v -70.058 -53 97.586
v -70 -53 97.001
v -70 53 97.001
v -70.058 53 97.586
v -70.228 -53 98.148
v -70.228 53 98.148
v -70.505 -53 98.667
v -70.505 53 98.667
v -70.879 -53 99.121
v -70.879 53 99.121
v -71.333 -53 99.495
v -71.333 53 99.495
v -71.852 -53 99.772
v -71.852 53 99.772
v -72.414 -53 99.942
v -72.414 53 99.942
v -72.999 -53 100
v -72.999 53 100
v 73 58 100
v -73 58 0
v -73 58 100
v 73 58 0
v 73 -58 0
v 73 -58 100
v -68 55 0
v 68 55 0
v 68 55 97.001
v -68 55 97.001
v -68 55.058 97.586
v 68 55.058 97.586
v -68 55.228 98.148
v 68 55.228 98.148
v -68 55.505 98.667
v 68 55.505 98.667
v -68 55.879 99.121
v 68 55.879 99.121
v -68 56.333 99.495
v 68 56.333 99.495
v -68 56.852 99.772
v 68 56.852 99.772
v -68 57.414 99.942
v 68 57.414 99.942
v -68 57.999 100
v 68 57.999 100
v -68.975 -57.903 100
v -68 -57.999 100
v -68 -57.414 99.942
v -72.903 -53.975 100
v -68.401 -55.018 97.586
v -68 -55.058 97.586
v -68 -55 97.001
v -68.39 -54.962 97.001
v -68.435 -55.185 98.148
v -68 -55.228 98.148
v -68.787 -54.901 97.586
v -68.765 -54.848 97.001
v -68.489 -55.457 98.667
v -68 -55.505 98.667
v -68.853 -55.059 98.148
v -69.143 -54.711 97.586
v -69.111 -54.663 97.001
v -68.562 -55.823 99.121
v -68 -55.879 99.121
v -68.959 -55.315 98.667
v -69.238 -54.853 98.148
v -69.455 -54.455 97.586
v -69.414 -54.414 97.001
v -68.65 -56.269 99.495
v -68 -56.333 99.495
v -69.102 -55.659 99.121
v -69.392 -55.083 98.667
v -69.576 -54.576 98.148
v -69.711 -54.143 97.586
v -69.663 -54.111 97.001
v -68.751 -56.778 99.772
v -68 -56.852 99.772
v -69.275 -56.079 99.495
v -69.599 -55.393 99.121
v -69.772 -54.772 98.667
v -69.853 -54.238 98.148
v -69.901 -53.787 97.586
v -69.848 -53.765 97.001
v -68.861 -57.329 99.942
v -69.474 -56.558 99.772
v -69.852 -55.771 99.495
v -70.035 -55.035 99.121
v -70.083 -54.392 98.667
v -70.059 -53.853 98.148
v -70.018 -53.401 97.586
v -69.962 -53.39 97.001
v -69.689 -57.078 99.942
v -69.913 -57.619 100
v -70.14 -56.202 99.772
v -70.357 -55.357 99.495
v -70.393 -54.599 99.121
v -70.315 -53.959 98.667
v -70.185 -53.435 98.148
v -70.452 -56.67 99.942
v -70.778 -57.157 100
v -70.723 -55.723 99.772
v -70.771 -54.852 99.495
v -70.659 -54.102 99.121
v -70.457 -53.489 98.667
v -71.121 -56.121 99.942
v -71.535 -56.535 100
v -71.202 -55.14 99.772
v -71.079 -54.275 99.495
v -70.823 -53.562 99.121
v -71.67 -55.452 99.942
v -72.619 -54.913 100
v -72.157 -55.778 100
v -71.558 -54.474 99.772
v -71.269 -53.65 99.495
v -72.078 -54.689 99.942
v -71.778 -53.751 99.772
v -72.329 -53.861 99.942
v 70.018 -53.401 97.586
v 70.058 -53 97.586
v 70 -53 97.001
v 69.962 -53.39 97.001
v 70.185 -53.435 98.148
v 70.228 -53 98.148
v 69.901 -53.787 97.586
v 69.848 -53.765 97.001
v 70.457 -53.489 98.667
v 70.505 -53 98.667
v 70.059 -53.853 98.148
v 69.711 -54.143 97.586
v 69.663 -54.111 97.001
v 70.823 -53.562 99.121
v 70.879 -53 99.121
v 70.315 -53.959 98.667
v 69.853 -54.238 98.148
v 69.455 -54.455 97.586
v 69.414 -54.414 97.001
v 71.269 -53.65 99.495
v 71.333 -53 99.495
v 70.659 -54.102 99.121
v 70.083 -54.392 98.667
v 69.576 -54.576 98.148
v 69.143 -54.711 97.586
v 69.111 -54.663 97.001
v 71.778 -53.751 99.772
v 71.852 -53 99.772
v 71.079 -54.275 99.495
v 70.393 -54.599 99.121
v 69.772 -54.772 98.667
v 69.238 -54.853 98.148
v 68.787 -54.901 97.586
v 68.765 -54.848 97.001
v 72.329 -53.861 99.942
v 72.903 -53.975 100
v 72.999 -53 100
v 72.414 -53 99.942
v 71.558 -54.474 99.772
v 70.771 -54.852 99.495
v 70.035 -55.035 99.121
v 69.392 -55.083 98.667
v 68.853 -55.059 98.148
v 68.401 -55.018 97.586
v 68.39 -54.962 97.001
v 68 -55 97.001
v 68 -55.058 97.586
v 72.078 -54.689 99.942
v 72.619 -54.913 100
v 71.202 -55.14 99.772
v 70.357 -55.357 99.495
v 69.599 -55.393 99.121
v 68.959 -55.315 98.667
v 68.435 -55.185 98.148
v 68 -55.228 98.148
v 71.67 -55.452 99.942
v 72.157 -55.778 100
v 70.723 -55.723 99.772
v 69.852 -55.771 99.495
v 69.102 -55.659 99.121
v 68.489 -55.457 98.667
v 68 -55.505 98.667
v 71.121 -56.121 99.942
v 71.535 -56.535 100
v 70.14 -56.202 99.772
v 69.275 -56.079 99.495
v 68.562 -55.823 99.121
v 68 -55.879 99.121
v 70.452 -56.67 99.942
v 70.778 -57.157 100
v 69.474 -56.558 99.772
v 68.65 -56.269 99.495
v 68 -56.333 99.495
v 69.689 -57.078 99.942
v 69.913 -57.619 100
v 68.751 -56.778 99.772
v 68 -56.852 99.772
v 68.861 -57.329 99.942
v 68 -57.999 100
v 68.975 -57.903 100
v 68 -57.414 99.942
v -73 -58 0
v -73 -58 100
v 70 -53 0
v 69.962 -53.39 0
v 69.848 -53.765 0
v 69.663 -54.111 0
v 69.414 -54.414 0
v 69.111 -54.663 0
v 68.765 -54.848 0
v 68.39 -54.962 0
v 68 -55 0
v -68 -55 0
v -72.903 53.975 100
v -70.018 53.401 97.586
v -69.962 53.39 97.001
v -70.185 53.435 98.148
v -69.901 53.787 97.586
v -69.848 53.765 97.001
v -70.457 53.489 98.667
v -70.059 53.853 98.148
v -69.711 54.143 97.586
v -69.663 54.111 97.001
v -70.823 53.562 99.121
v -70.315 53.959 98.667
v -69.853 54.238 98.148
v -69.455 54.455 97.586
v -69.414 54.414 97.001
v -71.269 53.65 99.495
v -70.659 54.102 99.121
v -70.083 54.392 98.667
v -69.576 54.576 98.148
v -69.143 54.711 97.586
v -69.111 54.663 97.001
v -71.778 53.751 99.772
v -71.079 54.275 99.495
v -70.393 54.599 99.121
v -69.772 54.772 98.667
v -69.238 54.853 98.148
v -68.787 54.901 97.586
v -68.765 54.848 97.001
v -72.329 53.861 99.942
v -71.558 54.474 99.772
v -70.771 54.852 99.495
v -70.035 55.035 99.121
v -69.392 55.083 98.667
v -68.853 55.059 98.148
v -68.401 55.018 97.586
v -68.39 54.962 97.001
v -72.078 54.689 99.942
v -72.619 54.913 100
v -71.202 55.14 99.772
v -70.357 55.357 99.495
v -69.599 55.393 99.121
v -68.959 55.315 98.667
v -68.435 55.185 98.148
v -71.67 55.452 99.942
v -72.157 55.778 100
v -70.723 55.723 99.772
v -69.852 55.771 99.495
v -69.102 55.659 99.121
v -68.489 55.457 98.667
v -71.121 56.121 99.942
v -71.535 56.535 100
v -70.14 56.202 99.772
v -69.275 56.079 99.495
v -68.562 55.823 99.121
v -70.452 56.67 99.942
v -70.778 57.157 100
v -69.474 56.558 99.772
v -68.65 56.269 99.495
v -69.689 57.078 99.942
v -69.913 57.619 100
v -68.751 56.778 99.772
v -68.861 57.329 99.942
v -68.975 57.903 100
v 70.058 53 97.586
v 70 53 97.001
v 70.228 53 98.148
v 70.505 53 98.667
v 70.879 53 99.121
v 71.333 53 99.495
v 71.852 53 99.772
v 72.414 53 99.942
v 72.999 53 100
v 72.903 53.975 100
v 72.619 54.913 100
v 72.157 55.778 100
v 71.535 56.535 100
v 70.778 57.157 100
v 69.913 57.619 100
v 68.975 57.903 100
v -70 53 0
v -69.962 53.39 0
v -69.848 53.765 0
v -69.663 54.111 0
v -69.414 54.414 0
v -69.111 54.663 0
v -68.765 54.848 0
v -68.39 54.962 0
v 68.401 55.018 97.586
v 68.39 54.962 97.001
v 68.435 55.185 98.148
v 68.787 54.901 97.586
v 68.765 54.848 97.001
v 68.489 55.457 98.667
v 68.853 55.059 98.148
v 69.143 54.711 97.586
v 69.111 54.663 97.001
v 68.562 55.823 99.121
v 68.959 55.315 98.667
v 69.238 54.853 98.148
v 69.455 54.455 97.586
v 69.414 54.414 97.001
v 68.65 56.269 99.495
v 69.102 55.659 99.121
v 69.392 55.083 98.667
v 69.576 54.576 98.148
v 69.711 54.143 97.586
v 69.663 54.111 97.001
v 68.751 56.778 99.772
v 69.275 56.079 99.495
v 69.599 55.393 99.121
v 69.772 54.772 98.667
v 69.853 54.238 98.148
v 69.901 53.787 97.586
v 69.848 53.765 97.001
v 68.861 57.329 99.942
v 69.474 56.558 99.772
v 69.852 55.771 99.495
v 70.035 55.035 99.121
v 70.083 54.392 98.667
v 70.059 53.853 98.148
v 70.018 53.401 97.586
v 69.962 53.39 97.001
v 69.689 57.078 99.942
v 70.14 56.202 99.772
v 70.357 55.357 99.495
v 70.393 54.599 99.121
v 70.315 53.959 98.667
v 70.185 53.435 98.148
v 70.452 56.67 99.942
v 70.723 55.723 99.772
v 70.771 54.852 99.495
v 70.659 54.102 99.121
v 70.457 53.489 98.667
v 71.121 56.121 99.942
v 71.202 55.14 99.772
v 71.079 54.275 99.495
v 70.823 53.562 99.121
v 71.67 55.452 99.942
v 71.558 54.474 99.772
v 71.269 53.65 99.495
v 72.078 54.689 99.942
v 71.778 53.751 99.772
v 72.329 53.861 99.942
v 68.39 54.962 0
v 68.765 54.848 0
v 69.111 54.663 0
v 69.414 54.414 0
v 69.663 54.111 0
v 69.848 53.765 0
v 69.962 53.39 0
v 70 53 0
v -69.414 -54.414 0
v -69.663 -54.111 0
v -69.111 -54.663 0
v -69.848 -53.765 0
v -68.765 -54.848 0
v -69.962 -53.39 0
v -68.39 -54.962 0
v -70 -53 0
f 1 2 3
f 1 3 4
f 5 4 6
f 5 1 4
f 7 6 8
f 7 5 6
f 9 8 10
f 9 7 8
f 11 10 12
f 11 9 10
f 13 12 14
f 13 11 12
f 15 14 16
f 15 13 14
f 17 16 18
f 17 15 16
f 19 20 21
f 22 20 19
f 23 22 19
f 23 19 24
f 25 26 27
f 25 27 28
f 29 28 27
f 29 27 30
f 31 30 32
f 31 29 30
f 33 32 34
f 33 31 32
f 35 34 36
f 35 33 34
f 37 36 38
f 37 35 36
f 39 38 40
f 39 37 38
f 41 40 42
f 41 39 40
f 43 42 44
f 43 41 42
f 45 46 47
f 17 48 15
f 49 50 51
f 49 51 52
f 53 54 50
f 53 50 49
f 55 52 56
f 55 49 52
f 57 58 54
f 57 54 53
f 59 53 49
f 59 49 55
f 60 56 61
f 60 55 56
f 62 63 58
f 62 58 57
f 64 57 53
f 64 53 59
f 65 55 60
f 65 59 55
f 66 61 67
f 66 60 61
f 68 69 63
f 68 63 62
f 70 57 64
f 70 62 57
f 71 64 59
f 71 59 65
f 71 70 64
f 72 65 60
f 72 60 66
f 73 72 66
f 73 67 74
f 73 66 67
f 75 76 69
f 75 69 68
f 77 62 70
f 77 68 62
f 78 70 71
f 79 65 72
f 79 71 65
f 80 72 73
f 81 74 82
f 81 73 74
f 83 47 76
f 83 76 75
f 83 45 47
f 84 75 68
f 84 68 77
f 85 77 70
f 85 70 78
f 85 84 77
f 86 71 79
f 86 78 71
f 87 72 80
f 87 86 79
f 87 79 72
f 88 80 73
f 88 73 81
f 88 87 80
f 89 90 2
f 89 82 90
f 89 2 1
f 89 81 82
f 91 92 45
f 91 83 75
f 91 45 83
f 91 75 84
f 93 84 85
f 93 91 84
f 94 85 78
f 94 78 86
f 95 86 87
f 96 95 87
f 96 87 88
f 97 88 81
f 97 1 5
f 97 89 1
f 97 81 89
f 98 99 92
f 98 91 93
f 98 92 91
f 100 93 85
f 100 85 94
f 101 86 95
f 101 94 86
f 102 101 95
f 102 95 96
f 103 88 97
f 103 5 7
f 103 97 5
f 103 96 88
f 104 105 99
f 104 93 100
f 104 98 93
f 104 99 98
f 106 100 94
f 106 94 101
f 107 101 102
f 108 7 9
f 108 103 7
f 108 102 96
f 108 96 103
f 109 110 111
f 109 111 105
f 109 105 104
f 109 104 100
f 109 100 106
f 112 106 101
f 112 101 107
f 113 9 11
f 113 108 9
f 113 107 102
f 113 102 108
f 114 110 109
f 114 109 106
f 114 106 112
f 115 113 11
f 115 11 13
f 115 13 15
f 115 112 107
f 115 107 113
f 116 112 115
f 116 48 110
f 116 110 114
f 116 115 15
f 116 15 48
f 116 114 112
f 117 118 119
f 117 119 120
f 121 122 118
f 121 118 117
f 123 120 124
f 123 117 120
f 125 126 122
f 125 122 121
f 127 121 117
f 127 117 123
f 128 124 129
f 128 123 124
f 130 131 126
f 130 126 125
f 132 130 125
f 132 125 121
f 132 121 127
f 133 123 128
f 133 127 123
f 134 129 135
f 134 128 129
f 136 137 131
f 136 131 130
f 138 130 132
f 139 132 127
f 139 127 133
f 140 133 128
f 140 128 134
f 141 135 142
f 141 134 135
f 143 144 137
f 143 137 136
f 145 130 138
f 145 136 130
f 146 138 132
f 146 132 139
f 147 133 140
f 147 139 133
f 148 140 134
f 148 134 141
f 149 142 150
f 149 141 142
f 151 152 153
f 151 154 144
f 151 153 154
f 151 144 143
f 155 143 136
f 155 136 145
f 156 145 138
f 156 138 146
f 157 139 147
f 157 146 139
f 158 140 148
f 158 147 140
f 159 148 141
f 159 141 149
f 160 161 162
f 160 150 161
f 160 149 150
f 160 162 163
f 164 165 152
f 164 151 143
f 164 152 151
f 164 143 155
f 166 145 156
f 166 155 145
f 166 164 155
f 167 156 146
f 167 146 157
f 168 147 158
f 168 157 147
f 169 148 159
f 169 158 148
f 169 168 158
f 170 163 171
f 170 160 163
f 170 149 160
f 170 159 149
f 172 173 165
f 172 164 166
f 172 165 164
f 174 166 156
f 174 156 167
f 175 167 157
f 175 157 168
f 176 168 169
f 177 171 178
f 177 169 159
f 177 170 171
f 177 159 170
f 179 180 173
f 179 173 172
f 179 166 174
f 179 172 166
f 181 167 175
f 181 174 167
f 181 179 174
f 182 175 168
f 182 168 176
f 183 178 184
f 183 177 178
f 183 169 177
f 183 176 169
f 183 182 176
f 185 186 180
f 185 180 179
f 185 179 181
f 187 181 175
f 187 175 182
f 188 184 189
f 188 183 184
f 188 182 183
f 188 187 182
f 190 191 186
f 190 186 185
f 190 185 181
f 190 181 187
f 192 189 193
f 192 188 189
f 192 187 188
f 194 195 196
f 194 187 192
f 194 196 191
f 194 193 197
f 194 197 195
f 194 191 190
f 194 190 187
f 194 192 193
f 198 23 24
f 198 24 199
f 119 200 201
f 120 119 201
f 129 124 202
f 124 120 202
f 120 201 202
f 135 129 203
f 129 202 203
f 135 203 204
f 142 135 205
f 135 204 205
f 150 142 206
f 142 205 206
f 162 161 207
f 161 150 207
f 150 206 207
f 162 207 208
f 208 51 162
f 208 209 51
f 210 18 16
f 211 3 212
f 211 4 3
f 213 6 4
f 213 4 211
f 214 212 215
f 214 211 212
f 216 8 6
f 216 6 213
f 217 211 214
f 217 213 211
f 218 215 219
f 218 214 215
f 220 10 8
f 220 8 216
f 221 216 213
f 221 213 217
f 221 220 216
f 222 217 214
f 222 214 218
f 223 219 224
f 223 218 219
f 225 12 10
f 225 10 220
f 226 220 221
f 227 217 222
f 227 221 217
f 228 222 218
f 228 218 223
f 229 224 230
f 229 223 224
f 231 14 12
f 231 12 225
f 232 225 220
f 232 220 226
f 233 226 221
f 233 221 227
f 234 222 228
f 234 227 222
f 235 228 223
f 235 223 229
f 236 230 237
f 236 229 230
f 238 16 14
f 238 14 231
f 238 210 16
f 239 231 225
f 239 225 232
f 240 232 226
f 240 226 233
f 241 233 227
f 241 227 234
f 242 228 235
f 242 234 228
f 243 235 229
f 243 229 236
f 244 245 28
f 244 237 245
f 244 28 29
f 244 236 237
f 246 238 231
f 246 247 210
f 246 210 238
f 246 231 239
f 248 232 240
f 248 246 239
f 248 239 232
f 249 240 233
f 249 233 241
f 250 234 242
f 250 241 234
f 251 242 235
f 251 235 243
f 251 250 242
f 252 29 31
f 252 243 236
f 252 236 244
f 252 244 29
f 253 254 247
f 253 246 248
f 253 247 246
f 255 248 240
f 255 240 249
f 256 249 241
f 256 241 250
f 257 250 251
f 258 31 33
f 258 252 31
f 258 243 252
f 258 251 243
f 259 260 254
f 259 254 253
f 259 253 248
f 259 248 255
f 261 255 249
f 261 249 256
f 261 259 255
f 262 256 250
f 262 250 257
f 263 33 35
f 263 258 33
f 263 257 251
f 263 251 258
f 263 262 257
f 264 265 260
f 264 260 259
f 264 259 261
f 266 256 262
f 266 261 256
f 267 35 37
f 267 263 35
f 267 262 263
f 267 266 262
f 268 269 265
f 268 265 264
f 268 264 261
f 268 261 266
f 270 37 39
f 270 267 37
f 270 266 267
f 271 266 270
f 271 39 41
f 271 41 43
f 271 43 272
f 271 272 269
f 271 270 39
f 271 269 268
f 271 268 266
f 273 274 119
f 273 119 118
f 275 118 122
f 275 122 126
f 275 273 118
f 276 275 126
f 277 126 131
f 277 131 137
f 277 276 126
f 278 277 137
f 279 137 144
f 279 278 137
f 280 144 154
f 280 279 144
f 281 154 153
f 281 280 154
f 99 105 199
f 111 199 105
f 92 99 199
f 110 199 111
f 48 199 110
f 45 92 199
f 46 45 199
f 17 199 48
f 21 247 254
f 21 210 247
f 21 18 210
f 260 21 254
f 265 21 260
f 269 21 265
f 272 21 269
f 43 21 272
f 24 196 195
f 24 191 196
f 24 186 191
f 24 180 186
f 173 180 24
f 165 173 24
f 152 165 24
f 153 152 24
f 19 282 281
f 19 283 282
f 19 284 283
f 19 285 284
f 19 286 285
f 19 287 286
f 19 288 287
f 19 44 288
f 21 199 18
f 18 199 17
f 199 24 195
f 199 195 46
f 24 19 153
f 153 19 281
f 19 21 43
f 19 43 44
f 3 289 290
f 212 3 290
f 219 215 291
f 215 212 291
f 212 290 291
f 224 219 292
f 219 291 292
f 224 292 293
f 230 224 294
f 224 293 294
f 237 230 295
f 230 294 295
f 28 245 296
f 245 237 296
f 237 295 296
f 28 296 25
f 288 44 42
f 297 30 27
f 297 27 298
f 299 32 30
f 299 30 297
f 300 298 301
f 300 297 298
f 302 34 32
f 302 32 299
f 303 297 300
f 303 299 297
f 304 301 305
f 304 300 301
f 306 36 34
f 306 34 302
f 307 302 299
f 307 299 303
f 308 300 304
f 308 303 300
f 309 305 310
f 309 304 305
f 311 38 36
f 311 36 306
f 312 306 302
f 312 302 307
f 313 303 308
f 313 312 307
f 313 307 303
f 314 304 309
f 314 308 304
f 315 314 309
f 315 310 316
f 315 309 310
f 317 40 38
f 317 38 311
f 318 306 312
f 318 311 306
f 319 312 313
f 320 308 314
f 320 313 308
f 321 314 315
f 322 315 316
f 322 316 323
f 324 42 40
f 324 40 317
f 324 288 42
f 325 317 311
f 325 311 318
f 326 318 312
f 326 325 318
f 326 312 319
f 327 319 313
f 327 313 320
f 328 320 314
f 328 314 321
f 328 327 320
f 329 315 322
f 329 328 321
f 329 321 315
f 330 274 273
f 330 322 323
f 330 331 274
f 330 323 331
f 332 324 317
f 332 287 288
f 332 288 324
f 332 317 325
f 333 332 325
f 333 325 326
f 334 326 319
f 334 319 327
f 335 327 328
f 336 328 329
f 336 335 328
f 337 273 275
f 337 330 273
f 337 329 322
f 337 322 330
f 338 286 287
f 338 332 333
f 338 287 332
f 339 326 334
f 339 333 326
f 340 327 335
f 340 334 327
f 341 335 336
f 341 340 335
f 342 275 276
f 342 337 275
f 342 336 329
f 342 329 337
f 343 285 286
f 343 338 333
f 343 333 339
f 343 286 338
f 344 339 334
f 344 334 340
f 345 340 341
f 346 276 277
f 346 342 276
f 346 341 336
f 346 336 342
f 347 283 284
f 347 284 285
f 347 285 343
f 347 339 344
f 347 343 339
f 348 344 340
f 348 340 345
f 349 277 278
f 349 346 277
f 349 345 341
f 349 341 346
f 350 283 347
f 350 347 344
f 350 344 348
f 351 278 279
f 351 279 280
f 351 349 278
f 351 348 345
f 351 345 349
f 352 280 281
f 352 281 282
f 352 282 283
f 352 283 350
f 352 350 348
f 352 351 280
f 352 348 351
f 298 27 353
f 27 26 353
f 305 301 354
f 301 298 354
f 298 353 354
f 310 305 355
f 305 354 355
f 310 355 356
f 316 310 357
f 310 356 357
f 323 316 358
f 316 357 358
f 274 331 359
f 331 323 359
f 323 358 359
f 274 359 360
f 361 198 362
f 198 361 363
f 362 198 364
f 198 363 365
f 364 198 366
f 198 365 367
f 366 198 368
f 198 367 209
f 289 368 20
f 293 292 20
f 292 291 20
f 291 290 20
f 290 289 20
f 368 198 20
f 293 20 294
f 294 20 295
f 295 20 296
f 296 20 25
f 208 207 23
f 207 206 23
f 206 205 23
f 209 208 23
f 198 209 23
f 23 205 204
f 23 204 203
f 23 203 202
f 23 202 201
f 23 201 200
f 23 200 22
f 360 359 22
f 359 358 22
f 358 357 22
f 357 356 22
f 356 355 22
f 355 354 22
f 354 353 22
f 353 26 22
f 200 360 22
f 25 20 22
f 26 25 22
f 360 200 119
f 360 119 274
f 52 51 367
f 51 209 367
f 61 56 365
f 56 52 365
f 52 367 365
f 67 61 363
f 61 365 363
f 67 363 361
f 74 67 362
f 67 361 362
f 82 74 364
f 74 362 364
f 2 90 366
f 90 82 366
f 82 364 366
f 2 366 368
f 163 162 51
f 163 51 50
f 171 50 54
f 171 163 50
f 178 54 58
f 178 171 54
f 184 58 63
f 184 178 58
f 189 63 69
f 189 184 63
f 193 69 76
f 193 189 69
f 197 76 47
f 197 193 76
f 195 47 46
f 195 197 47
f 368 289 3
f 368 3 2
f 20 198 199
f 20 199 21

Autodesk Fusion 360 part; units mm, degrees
sketch "草图2" plane through (0, 0, 0) normal (0, 0, 1) x (1, 0, 0)
  line L0 (68, 55) -> (-68, 55)
  line L1 (-70, 53) -> (-70, -53)
  line L2 (-68, -55) -> (68, -55)
  line L3 (70, -53) -> (70, 53)
  line L4 (70, 55) -> (-70, -55) construction
  line L5 (-70, 55) -> (70, -55) construction
  arc A0 (70, 53) -> (68, 55) centre (68, 53) ccw
  arc A1 (68, -55) -> (70, -53) centre (68, -53) ccw
  arc A2 (-70, -53) -> (-68, -55) centre (-68, -53) ccw
  arc A3 (-68, 55) -> (-70, 53) centre (-68, 53) ccw
  line L6 (-68, -58) -> (68, -58)
  line L7 (73, -53) -> (73, 53)
  line L8 (68, 58) -> (-68, 58)
  line L9 (-73, 53) -> (-73, -53)
  line L10 (-73, 58) -> (73, 58)
  line L11 (73, 58) -> (73, -58)
  line L12 (73, -58) -> (-73, -58)
  line L13 (-73, -58) -> (-73, 58)
  dimension "d11" = 140
  dimension "d12" = 110
  dimension "d14" = 2
  dimension "d15" = 116
  dimension "d16" = 146
extrude "拉伸1" add sketch "草图2" along normal blind 100
fillet "圆角1" radius 3 8 edges at (70, 0, 100) (69.4142, -54.4142, 100) (0, -55, 100) (-69.4142, -54.4142, 100) (-70, 0, 100) (-69.4142, 54.4142, 100) (0, 55, 100) (69.4142, 54.4142, 100)
